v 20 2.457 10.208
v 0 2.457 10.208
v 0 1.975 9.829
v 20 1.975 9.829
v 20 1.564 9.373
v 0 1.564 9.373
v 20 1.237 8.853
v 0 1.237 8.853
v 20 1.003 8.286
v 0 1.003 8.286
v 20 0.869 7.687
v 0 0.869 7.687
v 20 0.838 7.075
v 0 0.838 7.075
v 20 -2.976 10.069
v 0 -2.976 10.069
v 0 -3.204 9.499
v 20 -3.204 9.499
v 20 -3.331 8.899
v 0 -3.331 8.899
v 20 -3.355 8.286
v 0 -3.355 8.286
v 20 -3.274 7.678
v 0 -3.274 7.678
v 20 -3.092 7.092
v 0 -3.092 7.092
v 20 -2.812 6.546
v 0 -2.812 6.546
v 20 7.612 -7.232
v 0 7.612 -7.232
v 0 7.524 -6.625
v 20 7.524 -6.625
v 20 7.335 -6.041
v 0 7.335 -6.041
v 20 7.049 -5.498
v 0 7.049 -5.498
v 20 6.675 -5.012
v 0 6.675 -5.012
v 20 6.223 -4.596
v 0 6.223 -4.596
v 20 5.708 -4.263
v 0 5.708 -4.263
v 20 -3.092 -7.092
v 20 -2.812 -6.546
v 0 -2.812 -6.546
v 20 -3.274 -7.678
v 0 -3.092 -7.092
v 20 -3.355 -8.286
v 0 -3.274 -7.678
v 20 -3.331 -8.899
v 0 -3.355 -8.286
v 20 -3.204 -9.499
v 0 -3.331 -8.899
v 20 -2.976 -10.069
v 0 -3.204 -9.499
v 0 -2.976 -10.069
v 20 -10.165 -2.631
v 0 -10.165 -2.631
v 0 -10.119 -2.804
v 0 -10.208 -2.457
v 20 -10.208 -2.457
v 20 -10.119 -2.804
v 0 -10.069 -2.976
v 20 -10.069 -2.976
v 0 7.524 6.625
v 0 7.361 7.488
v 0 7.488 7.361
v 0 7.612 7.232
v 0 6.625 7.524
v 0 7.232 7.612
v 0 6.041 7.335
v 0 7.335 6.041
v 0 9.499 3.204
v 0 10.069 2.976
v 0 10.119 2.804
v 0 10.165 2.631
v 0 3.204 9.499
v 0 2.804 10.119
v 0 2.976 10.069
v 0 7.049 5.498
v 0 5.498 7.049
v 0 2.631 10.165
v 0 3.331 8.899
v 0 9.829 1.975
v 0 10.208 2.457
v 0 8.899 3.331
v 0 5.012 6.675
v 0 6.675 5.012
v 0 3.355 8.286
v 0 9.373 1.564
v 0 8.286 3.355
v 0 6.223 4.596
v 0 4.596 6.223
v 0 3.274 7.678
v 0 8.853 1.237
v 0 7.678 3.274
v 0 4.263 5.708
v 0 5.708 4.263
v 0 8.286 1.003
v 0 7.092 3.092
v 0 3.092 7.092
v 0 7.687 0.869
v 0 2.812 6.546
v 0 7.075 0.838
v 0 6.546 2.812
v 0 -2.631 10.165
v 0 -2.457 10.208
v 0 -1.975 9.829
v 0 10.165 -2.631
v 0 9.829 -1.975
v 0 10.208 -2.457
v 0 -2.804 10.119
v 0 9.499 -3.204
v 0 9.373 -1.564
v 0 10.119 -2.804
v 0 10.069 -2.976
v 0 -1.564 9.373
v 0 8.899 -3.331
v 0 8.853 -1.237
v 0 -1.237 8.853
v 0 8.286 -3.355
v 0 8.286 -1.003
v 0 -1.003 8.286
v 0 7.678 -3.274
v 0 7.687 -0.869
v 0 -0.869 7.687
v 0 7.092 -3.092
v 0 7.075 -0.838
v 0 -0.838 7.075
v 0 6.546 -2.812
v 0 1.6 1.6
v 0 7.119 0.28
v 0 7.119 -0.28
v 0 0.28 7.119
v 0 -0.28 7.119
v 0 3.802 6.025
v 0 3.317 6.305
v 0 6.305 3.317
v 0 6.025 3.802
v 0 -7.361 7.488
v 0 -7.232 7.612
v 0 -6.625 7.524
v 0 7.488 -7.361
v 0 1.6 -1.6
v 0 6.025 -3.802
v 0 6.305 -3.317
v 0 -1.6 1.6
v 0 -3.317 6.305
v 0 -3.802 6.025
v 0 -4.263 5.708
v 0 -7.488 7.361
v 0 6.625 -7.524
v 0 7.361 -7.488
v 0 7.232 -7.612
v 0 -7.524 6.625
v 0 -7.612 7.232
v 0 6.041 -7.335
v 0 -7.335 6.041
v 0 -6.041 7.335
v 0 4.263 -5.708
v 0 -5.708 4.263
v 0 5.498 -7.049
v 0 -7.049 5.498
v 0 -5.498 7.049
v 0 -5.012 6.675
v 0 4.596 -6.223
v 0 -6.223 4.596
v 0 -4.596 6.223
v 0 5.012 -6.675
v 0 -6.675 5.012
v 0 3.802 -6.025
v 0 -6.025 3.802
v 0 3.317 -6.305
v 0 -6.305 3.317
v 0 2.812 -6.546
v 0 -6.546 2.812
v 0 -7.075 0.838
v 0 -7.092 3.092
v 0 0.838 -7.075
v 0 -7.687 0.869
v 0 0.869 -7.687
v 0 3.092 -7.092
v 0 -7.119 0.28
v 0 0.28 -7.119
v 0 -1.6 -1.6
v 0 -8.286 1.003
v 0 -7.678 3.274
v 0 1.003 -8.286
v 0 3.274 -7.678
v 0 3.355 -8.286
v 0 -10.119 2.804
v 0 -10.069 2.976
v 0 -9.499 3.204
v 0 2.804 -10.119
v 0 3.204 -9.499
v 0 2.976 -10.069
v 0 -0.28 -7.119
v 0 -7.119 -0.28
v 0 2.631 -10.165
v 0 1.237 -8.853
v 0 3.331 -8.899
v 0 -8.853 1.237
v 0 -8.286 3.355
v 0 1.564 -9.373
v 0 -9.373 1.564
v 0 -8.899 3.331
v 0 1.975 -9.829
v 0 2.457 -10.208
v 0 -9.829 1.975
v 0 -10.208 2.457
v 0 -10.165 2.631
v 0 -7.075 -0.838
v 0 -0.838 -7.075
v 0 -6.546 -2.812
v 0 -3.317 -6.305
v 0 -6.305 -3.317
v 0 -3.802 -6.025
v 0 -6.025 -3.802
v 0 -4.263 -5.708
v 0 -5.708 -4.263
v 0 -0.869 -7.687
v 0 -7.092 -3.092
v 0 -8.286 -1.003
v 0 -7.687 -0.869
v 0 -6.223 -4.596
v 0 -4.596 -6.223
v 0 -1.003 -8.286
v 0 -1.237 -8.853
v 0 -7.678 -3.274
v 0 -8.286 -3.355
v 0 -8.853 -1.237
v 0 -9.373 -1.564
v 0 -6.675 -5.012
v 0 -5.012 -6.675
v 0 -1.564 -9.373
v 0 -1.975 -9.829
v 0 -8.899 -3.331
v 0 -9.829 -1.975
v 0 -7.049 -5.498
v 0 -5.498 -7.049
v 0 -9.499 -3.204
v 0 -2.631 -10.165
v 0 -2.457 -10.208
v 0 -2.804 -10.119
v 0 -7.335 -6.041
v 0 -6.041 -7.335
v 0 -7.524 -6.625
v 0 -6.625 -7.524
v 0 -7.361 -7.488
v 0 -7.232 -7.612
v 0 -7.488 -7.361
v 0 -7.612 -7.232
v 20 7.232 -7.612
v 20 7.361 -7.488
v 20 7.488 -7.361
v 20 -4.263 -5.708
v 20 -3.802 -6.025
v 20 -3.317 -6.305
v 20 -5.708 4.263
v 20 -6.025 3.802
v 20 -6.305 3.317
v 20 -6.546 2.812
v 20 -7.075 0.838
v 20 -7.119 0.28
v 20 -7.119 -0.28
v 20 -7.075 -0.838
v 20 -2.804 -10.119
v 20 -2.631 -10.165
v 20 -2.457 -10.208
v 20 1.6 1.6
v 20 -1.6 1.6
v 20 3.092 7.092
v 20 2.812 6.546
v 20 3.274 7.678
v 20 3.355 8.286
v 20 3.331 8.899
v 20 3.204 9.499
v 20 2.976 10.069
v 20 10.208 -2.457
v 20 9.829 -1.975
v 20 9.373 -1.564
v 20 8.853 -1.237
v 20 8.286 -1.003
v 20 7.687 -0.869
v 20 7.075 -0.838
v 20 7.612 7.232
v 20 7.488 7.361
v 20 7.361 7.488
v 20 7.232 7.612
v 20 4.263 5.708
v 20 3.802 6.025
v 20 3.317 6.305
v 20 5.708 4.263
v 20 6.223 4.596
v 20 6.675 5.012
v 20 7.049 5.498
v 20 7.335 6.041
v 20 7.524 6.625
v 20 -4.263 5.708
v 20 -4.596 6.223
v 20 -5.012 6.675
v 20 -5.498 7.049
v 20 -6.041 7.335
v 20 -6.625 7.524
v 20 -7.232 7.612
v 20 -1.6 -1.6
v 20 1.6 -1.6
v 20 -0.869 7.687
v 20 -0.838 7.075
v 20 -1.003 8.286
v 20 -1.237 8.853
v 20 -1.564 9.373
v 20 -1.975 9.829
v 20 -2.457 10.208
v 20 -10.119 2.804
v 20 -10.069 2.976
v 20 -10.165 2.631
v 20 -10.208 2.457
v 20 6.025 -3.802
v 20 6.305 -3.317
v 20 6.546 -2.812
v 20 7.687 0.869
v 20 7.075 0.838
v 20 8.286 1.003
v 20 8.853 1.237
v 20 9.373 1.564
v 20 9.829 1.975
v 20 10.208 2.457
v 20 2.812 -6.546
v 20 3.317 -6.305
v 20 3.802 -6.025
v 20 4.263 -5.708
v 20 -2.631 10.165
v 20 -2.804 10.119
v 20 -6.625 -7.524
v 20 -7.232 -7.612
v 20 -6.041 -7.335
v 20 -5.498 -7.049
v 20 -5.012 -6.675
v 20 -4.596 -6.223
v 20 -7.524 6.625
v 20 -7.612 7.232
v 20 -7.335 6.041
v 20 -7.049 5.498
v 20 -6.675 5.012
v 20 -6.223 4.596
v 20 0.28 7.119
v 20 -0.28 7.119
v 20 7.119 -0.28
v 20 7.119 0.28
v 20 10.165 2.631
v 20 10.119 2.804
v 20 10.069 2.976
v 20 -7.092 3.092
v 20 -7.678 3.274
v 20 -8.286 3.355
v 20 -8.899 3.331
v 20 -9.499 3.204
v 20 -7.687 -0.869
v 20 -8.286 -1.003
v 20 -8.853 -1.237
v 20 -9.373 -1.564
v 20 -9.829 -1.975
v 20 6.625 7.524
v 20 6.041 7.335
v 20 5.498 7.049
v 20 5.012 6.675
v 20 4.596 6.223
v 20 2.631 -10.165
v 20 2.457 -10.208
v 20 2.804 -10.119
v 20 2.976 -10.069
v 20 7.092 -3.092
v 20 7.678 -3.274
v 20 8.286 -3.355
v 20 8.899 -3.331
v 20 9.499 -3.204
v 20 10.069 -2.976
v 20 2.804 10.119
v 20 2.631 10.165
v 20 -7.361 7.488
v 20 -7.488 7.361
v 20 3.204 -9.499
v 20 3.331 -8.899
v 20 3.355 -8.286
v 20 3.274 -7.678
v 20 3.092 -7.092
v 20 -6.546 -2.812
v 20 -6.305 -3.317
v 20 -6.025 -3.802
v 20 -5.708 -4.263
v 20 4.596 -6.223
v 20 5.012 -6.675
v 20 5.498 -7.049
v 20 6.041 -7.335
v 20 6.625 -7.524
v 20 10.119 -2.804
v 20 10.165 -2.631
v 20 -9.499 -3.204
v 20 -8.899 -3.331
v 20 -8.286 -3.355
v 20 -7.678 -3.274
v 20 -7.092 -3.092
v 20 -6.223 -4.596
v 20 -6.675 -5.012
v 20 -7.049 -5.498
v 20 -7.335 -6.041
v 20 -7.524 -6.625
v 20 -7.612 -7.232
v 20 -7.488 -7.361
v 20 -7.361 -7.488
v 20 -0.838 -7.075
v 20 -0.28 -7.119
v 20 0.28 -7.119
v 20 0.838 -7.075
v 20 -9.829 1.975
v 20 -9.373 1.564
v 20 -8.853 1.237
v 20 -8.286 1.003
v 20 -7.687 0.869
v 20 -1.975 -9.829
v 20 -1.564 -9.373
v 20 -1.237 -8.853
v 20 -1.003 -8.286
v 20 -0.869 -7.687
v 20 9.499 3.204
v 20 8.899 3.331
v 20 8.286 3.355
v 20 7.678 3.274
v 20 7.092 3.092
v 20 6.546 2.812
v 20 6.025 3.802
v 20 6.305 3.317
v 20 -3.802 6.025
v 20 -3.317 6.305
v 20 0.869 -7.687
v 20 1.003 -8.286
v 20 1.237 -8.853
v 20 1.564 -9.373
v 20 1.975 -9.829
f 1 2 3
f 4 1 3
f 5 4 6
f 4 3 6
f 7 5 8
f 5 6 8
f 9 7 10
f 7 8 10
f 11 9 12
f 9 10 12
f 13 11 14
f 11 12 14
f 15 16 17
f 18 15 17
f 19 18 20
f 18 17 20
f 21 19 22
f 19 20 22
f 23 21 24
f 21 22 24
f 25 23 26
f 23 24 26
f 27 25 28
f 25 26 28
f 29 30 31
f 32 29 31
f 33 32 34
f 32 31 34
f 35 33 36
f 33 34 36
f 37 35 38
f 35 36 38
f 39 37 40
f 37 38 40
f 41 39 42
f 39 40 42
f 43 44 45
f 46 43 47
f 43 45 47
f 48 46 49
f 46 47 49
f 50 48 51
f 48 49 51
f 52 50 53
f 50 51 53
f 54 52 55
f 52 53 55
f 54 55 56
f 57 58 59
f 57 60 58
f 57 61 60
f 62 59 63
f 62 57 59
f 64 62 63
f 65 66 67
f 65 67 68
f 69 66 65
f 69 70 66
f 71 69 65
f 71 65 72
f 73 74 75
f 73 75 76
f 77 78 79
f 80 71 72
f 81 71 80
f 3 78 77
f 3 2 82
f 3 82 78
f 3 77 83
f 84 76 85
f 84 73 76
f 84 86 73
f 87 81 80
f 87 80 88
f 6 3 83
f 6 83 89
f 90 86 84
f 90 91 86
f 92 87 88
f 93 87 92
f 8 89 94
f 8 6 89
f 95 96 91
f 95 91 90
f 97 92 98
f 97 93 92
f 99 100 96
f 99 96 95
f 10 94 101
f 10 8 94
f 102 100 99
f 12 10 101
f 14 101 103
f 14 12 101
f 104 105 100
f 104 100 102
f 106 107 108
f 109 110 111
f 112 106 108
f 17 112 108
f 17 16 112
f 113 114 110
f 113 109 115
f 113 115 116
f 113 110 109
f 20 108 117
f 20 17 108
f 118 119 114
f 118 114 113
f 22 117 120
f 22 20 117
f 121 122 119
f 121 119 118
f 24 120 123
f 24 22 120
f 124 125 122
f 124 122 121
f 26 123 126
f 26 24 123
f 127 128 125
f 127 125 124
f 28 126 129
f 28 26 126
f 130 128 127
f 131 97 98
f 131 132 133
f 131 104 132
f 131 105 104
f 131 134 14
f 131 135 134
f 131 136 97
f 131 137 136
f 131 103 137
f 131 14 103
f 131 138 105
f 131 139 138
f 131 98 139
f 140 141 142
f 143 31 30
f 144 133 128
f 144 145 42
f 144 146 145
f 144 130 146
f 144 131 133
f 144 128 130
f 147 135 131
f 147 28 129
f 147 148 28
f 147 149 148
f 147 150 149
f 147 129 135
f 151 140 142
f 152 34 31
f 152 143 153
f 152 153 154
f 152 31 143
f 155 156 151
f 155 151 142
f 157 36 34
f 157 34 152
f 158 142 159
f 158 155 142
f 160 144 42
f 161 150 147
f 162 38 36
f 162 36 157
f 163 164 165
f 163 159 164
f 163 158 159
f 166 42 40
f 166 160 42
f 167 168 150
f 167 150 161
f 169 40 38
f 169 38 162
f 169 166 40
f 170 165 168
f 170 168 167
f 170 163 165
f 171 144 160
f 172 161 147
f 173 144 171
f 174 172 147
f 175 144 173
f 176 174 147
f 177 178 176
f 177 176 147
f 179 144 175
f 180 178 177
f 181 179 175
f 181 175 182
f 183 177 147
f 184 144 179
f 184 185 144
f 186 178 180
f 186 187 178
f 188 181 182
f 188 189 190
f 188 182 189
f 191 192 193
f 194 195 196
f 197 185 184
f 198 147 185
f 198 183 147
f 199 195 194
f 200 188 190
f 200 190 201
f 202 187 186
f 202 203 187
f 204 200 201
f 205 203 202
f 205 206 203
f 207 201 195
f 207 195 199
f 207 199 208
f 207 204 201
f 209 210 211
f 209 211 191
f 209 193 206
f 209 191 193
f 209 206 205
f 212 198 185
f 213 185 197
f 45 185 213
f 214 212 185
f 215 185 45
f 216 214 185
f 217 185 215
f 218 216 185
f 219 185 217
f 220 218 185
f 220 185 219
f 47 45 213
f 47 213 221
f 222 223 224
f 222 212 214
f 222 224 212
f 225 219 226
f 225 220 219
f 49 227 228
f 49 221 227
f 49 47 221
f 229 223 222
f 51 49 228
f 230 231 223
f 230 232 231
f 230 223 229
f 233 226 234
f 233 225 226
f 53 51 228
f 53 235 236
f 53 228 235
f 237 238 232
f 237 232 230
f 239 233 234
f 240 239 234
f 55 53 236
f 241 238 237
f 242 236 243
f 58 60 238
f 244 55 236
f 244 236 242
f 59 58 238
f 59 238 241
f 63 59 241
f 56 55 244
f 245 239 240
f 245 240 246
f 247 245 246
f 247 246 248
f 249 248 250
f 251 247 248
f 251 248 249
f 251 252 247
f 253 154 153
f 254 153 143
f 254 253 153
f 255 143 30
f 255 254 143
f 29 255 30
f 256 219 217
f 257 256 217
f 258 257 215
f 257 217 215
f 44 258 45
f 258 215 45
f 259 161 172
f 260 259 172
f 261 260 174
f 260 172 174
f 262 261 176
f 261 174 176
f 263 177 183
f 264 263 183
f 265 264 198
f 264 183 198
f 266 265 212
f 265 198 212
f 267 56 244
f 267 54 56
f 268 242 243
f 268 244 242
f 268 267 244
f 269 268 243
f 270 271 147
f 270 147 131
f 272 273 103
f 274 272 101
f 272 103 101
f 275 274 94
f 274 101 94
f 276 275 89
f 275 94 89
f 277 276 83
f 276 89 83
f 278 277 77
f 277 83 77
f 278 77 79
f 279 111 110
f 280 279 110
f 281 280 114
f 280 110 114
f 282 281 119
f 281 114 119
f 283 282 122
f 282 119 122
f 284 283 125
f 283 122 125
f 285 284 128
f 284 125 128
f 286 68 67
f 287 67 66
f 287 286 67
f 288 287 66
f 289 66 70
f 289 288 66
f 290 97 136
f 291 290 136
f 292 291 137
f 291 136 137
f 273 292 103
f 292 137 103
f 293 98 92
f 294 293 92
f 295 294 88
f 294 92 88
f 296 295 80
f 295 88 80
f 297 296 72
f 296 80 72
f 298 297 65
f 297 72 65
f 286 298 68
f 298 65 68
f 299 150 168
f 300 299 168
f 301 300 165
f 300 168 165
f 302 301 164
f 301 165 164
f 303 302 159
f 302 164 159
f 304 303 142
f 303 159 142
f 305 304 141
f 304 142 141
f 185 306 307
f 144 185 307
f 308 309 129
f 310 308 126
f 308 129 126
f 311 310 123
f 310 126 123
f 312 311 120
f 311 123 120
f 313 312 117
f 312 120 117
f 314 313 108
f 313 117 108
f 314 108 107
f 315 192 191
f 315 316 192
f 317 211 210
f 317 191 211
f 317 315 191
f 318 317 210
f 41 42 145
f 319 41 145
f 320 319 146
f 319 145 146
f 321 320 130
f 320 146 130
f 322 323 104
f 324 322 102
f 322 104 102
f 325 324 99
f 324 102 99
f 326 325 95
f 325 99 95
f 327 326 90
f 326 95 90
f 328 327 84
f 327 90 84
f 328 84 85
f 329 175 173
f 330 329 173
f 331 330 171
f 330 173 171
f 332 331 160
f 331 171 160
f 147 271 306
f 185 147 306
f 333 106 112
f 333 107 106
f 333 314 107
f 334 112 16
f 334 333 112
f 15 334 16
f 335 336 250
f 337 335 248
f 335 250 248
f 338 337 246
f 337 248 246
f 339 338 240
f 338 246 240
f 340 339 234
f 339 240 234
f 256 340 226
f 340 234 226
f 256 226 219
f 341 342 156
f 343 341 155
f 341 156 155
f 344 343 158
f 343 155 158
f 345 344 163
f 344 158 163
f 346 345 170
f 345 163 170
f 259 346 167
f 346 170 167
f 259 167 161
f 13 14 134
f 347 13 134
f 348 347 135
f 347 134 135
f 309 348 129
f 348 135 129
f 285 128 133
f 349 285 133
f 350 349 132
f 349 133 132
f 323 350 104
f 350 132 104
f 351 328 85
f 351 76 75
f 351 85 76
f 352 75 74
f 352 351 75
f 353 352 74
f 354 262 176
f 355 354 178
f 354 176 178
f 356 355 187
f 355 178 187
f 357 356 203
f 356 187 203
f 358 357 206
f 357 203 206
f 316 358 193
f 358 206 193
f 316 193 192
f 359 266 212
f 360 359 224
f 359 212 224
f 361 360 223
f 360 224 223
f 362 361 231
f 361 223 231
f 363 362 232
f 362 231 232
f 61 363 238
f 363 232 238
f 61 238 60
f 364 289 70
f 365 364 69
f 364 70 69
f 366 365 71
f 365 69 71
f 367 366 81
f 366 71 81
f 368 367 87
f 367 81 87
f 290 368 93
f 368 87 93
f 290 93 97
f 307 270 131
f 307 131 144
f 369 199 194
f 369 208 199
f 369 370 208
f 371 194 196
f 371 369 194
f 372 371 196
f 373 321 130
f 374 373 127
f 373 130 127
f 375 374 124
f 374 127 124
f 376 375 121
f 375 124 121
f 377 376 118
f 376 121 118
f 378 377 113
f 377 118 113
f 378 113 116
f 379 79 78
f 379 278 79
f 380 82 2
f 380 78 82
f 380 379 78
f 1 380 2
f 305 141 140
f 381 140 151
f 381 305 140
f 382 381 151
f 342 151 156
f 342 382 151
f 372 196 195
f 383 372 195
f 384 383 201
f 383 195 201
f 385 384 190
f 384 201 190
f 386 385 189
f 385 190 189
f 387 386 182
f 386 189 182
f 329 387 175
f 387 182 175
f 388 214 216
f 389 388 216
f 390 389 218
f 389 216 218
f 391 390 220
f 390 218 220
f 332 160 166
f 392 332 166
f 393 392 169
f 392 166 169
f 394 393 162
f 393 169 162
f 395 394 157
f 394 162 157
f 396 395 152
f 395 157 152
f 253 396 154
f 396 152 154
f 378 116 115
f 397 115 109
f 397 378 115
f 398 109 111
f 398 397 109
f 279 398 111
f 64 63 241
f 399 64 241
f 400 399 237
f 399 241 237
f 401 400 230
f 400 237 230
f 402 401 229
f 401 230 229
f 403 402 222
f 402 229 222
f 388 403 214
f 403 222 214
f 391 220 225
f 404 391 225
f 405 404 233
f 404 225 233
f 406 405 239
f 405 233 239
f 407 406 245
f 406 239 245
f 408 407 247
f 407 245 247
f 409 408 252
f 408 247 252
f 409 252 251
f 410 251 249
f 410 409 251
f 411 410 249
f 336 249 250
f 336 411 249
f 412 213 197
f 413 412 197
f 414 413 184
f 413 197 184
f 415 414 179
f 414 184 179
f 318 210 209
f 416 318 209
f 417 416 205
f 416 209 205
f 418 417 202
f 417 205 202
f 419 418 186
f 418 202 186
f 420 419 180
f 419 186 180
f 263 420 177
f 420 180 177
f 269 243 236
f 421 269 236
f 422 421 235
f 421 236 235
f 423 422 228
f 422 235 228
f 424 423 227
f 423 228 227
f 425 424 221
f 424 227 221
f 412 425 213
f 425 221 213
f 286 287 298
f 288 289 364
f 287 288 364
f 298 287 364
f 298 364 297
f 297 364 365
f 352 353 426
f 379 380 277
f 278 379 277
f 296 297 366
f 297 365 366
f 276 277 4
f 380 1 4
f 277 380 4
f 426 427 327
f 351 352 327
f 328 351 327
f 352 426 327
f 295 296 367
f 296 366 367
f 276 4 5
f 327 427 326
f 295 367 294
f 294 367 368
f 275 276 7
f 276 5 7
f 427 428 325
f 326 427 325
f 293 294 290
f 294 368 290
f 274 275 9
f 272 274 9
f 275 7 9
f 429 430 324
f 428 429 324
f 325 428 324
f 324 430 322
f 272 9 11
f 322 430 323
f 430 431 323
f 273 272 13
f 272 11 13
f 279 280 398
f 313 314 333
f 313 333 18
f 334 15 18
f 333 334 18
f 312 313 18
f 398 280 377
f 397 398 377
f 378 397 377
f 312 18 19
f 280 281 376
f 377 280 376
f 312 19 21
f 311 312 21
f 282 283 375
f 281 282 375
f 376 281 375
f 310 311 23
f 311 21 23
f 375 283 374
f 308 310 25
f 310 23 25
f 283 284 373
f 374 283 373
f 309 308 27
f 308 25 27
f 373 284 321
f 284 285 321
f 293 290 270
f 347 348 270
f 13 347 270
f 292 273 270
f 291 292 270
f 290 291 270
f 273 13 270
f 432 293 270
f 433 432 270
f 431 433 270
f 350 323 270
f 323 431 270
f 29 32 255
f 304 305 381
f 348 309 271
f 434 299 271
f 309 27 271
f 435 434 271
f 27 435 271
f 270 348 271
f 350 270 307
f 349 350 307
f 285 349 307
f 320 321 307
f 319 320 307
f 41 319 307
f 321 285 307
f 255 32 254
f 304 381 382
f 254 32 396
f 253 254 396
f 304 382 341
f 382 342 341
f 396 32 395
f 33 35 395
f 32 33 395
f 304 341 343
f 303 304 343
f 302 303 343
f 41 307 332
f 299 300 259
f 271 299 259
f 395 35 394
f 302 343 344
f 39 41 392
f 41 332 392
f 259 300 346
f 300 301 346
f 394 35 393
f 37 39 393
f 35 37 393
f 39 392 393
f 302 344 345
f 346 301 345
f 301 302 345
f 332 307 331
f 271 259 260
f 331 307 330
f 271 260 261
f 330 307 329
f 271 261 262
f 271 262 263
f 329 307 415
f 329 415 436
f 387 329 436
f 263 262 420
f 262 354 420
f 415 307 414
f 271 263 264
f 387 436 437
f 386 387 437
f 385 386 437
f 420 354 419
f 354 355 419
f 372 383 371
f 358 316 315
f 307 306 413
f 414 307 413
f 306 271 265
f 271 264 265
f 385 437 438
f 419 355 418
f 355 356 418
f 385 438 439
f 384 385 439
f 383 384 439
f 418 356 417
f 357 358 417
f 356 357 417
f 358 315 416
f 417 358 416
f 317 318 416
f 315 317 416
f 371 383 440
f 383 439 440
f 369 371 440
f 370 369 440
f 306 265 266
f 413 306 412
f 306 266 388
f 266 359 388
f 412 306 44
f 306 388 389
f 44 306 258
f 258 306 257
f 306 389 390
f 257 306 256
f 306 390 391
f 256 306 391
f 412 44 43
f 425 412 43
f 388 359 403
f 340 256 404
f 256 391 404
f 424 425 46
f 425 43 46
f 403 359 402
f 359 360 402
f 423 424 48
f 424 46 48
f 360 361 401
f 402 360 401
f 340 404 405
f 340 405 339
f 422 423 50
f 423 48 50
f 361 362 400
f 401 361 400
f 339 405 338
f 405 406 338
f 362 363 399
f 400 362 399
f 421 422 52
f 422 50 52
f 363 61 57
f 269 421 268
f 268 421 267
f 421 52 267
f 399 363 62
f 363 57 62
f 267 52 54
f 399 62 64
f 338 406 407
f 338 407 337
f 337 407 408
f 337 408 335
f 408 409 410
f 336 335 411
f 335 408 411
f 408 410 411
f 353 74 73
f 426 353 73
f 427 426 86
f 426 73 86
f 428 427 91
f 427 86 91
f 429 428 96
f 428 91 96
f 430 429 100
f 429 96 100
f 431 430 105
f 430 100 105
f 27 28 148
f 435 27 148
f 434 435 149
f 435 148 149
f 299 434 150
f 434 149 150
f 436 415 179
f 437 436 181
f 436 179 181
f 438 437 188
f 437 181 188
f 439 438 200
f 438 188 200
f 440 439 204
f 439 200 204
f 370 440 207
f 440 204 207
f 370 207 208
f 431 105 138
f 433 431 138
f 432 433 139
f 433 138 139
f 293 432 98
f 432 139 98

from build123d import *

# Parameters (mm, degrees)
BASPROSKE_W        = 20
BASPROSKE_H        = 10.5
TOOTHCUT_DEPTH     = 25.909837414
TEETHCUTS_COUNT    = 12
TEETHCUTS_ANGLE    = 330
BORSKE_R           = 0.5
BORE_DEPTH         = 50.0000508
SKETCH1_W          = 3.2
SKETCH1_H          = 3.2
CUT_EXTRUDE1_DEPTH = 30


with BuildPart() as part:
    # BasProSke → Base-Revolve (revolve)
    with BuildSketch(Plane(origin=(0, 0, 0), x_dir=(1, 0, 0), z_dir=(0, 1, 0)), mode=Mode.PRIVATE) as base_revolve_sk:
        with Locations((10, 5.25)):
            Rectangle(BASPROSKE_W, BASPROSKE_H)
    revolve(base_revolve_sk.sketch.rotate(Axis((-10, 0, 0), (1, 0, 0)), 180), axis=Axis((-10, 0, 0), (1, 0, 0)))

    # TooCutSke → ToothCut (cut, through all)
    with BuildSketch(Plane(origin=(0, 0, 0), x_dir=(0, 0, -1), z_dir=(1, 0, 0))):
        with BuildLine():
            ThreePointArc((0.837751456, 7.074570552), (0, 7.124), (-0.837751456, 7.074570552))
            ThreePointArc((-0.837751456, 7.074570552), (-1.245380016, 8.868946541), (-2.486473743, 10.227487154))
            ThreePointArc((-2.486473743, 10.227487154), (0, 10.5254), (2.486473743, 10.227487154))
            ThreePointArc((2.486473743, 10.227487154), (1.245380016, 8.868946541), (0.837751456, 7.074570552))
        make_face()
    toothcut = extrude(amount=TOOTHCUT_DEPTH, mode=Mode.SUBTRACT)

    # TeethCuts: ToothCut ×12 about axis
    teethcuts_axis = Axis((-10, 0, 0), (1, 0, 0))
    for i in range(1, TEETHCUTS_COUNT):
        add(toothcut.rotate(teethcuts_axis, i * TEETHCUTS_ANGLE / (TEETHCUTS_COUNT - 1)), mode=Mode.SUBTRACT)

    # BorSke → Bore (cut, symmetric)
    with BuildSketch(Plane(origin=(0, 0, 0), x_dir=(0, 0, -1), z_dir=(1, 0, 0))):
        with Locations(Location((0, 0, 0), (0, 0, 180))):
            Circle(BORSKE_R)
    extrude(amount=BORE_DEPTH, both=True, mode=Mode.SUBTRACT)

    # Sketch1 → Cut-Extrude1 (cut)
    with BuildSketch(Plane(origin=(20, 0, 0), x_dir=(0, 0, -1), z_dir=(1, 0, 0))):
        Rectangle(SKETCH1_W, SKETCH1_H)
    extrude(amount=-CUT_EXTRUDE1_DEPTH, mode=Mode.SUBTRACT)


solid = part.part
